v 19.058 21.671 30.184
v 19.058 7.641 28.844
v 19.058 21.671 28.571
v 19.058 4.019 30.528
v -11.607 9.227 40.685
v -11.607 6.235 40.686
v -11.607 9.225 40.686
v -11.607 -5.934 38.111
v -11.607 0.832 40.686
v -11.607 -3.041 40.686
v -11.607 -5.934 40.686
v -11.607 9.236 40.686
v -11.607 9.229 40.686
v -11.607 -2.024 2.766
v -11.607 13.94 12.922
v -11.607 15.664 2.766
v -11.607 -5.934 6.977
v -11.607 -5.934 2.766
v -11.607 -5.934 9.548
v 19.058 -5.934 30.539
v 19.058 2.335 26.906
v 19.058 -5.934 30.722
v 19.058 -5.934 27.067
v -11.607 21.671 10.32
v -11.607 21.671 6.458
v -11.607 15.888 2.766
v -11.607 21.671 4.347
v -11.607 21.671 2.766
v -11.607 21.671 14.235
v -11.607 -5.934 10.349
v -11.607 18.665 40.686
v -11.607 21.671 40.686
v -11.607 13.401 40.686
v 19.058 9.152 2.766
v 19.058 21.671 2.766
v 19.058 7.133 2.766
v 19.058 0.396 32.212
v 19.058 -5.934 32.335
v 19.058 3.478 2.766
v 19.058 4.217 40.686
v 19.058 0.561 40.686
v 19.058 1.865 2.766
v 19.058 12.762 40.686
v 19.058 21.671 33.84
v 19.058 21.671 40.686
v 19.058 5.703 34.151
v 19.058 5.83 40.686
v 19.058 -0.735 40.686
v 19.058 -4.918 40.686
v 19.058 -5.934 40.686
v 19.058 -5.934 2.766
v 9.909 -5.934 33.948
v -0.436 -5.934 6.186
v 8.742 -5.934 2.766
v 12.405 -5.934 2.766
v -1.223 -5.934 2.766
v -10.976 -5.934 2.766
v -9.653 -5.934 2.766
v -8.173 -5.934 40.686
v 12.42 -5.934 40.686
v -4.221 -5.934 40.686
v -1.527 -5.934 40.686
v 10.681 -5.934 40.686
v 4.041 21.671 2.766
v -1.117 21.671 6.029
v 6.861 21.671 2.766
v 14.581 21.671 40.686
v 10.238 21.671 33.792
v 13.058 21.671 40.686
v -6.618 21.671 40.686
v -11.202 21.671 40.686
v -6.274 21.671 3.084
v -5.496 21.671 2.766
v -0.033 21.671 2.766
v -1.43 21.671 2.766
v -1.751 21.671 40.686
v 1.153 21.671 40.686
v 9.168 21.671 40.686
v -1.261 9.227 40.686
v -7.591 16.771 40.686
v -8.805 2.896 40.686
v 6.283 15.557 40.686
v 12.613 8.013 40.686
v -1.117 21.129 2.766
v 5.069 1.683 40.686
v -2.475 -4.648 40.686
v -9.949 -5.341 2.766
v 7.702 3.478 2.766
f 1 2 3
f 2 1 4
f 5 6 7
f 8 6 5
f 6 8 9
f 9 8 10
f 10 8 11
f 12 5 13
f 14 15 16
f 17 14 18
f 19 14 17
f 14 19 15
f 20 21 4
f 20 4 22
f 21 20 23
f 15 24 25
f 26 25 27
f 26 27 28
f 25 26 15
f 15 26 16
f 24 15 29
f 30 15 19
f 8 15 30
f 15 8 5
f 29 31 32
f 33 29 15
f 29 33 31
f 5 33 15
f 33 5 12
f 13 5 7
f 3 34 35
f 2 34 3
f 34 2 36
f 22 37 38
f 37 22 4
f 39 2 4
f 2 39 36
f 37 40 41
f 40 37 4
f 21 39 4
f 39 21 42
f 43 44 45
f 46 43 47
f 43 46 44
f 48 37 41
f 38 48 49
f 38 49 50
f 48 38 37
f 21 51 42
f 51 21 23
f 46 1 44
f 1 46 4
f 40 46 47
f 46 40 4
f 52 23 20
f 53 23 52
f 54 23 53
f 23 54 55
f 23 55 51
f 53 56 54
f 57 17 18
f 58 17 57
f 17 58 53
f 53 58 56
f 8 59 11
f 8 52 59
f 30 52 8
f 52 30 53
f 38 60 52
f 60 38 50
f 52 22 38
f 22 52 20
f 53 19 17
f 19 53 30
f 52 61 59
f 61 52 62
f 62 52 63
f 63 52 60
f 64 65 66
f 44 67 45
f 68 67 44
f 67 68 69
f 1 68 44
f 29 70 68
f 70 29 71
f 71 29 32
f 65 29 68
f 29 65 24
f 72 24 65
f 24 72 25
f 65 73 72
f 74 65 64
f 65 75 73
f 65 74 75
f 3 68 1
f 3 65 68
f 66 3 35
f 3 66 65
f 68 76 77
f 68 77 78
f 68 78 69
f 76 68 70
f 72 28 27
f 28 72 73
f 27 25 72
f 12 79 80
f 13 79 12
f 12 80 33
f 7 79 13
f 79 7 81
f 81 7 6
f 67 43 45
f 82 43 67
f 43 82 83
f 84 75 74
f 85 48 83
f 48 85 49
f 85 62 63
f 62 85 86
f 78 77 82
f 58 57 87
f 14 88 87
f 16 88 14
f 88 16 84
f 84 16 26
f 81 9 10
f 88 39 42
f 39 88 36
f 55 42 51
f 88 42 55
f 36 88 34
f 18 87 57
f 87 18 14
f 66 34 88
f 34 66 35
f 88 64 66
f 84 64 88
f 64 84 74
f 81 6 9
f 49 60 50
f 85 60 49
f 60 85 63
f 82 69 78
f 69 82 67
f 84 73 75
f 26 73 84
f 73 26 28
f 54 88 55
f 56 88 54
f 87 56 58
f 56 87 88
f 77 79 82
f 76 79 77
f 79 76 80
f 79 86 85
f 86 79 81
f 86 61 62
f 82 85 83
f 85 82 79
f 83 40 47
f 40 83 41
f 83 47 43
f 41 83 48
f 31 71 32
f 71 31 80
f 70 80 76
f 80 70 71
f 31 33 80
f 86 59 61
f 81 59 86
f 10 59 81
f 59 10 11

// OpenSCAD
 /* 
 Blind Geometric Composition  Torleif Ceder / TLC123 late summer 2021

 Within OpenSCAD the parameter evaluation is blind to resultant geometry.
 Here i collect operations that can reason and store result in intermediate shapes
 Thin slivers of epsilon thickness plays a important roll as 2d planes.
 We cannot scale  object in place without also translating them.
 We cannot rotate object in place without also translating them.
 All operations degrade processed geometry with epsilon sized smear.
 Dublicated close vertices at cornes and more is expected.  
 
 Lets build up a language of blind operations.  
 clad()
 inset()
 shell()
 
 From this we can construct a solid boundingbox
 That gives we can select the epsilon thic wall on each side
 
 BBoxUnTranslate()
 Strips the bounding box of translation and fix it to the origo.
 Frward caled a neutralized bounding box
 There we can scale it to half size or epsilon thin features

 BBoxHalf()
 Those can then be minkowski composed with one perpendicular thin wall slice.
 This effectively blindly replicates a boundingbox identical to the original but now translated half its own size without ever measuring itts dimentions. Pure mathemagics.

 Each bounding wall can be minkowski-summed 
 with a neutrilzed boundingbox, freely arbitrary in the face normal direction.
 
 Thereby we show that any cube within the bounding box
 can be constructed by intersecting a overlaping set of expanded boundingwalls
 
 Whith this language we can construct epsilon thin midplanes, axises, midpoints. Any any epsilon small cube in the bounding box can be minkowskied with arbitrary geomety. 
 
 if we construct a midpoint, the counter point, the sperical mirror
 aacross origo
 
 
 more to come
 
 */
//range=[-1:1];
//for(x=range,y=range,z=range){
//translate([x,y,z]*10)
//if(abs(x)+abs(y)+abs(z)==1)BBoxHalf([x,y,z])translate([-10,20,30])cube(10);
//
//}

t=rands(-10,10,3);
epsilon=10e-6;


// #BBoxHalf()
// BBox()
//geom(t);
 BBox()
geom(t);



module geom(t){ translate(t){
    
   rotate([10,20,30]) cube([10,20,30]);
   rotate([20,10,40]) cube([10,20,30]);

    }}

//minkowski (){
// translate(t) hull()

//translate(-t)cube(epsilon);
//}

 module BBoxHalf(d=[0,0,-1],  epsilon = 1e-6){
     crossscale=
         abs(d.x)==1?[1,epsilon,1]:
         abs(d.y)==1?[epsilon,1,1]:
         [epsilon,1,1];
     crosswall=
         abs(d.x)==1?[0,0,1]:
         abs(d.y)==1?[1,0,0]:
         [1,0,1];
     intersection(){
            color("red")hull()children();

            minkowski(){    
                BBoxWall(d)
                    hull()children();
                scale(crossscale)
                    BBoxUnTranslate() 
                        BBoxWall(crosswall)
                            hull()children();
            }
} 
}
 
 
 



module BBoxWall(d=[0,0,1],  epsilon = 1e-6)
{
difference(){
    
   translate(d*epsilon)
    children();
    children();
    }    
    
    }


// relocates bounding box  to the origo
module BBoxUnTranslate(){
//         % hull()children();
     scale(.5)
         minkowski(){
            hull() children();
             mirror([1,0,0])      mirror([0,1,0])      mirror([0,0,1])
            hull() children();
         
         }
 }
 
 
 
// inset 3d  "negative offset", optimally on convex hull
// else jagged inner corners by q quality factor 
module inset(r,q=20){
  a= generatepoints(q)*r;
//#children();
intersection_for(t=a){
      translate(t ) children();
    }
}


    // unionRound helper expand by r  "positive offset" fast on convex hull
    module clad(r,q=20) {
        minkowski() {
            children();
            //        icosphere(r,2);
             isosphere(r,q); 
        }
    }   
   
   module BBox(){
intersection(){
 cladX()hull()  children() ;
 cladY()hull()  children() ;
 cladZ()hull()  children() ;
    
    }
}
    module cladX(r,q=20) {
         hull()minkowski() {
            hull()children();
             
            rotate([  0,0,0])scale([epsilon,1,1])hull()children();
            rotate([ 90,0,0])scale([epsilon,1,1])hull()children();
            rotate([180,0,0])scale([epsilon,1,1])hull()children();
            rotate([270,0,0])scale([epsilon,1,1])hull()children();
        
            
            }
    }
        module cladY(r,q=20) {
         hull()minkowski() {
            hull()children();
             
            rotate([0,  0,0 ])scale([1,epsilon,1])hull()children();
            rotate([0, 90,0 ])scale([1,epsilon,1])hull()children();
            rotate([0,180,0 ])scale([1,epsilon,1])hull()children();
            rotate([0,270,0 ])scale([1,epsilon,1])hull()children();
        
            
            }
    }
        module cladZ(r,q=20) {
         hull()minkowski() {
            hull()children();
             
            rotate([0,0,  0 ])scale([1,1,epsilon])hull()children();
            rotate([0,0, 90 ])scale([1,1,epsilon])hull()children();
            rotate([0,0,180 ])scale([1,1,epsilon])hull()children();
            rotate([0,0,270 ])scale([1,1,epsilon])hull()children();
        
            
            }
    }
    
    
    // unionRound helper
    module shell(r,q) {
        difference() {
            clad(r,q) children();
            children();
        }
    }

 /*    
    // The following is a sphere with some equidistant properties.
    // Not strictly necessary

    Kogan, Jonathan (2017) "A New Computationally Efficient Method for Spacing n Points on a Sphere," Rose-Hulman Undergraduate Mathematics Journal: Vol. 18 : Iss. 2 , Article 5.
    Available at: https://scholar.rose-hulman.edu/rhumj/vol18/iss2/5 */
    
    function sphericalcoordinate(x,y)=  [cos(x  )*cos(y  ), sin(x  )*cos(y  ), sin(y  )];
    function NX(n,x)= 
    let(toDeg=57.2958,PI=acos(-1)/toDeg,
    start=(-1.+1./(n-1.)),increment=(2.-2./(n-1.))/(n-1.) )
    [ for (j= [0:n-1])let (s=start+j*increment )
    sphericalcoordinate(   s*x*toDeg,  PI/2.* sign(s)*(1.-sqrt(1.-abs(s)))*toDeg)];
    function generatepoints(n)= NX(n,0.1+1.2*n);
    module isosphere(r,detail){
    a= generatepoints(detail);
    scale(r)hull()polyhedron(a,[[for(i=[0:len(a)-1])i]]);
    }
